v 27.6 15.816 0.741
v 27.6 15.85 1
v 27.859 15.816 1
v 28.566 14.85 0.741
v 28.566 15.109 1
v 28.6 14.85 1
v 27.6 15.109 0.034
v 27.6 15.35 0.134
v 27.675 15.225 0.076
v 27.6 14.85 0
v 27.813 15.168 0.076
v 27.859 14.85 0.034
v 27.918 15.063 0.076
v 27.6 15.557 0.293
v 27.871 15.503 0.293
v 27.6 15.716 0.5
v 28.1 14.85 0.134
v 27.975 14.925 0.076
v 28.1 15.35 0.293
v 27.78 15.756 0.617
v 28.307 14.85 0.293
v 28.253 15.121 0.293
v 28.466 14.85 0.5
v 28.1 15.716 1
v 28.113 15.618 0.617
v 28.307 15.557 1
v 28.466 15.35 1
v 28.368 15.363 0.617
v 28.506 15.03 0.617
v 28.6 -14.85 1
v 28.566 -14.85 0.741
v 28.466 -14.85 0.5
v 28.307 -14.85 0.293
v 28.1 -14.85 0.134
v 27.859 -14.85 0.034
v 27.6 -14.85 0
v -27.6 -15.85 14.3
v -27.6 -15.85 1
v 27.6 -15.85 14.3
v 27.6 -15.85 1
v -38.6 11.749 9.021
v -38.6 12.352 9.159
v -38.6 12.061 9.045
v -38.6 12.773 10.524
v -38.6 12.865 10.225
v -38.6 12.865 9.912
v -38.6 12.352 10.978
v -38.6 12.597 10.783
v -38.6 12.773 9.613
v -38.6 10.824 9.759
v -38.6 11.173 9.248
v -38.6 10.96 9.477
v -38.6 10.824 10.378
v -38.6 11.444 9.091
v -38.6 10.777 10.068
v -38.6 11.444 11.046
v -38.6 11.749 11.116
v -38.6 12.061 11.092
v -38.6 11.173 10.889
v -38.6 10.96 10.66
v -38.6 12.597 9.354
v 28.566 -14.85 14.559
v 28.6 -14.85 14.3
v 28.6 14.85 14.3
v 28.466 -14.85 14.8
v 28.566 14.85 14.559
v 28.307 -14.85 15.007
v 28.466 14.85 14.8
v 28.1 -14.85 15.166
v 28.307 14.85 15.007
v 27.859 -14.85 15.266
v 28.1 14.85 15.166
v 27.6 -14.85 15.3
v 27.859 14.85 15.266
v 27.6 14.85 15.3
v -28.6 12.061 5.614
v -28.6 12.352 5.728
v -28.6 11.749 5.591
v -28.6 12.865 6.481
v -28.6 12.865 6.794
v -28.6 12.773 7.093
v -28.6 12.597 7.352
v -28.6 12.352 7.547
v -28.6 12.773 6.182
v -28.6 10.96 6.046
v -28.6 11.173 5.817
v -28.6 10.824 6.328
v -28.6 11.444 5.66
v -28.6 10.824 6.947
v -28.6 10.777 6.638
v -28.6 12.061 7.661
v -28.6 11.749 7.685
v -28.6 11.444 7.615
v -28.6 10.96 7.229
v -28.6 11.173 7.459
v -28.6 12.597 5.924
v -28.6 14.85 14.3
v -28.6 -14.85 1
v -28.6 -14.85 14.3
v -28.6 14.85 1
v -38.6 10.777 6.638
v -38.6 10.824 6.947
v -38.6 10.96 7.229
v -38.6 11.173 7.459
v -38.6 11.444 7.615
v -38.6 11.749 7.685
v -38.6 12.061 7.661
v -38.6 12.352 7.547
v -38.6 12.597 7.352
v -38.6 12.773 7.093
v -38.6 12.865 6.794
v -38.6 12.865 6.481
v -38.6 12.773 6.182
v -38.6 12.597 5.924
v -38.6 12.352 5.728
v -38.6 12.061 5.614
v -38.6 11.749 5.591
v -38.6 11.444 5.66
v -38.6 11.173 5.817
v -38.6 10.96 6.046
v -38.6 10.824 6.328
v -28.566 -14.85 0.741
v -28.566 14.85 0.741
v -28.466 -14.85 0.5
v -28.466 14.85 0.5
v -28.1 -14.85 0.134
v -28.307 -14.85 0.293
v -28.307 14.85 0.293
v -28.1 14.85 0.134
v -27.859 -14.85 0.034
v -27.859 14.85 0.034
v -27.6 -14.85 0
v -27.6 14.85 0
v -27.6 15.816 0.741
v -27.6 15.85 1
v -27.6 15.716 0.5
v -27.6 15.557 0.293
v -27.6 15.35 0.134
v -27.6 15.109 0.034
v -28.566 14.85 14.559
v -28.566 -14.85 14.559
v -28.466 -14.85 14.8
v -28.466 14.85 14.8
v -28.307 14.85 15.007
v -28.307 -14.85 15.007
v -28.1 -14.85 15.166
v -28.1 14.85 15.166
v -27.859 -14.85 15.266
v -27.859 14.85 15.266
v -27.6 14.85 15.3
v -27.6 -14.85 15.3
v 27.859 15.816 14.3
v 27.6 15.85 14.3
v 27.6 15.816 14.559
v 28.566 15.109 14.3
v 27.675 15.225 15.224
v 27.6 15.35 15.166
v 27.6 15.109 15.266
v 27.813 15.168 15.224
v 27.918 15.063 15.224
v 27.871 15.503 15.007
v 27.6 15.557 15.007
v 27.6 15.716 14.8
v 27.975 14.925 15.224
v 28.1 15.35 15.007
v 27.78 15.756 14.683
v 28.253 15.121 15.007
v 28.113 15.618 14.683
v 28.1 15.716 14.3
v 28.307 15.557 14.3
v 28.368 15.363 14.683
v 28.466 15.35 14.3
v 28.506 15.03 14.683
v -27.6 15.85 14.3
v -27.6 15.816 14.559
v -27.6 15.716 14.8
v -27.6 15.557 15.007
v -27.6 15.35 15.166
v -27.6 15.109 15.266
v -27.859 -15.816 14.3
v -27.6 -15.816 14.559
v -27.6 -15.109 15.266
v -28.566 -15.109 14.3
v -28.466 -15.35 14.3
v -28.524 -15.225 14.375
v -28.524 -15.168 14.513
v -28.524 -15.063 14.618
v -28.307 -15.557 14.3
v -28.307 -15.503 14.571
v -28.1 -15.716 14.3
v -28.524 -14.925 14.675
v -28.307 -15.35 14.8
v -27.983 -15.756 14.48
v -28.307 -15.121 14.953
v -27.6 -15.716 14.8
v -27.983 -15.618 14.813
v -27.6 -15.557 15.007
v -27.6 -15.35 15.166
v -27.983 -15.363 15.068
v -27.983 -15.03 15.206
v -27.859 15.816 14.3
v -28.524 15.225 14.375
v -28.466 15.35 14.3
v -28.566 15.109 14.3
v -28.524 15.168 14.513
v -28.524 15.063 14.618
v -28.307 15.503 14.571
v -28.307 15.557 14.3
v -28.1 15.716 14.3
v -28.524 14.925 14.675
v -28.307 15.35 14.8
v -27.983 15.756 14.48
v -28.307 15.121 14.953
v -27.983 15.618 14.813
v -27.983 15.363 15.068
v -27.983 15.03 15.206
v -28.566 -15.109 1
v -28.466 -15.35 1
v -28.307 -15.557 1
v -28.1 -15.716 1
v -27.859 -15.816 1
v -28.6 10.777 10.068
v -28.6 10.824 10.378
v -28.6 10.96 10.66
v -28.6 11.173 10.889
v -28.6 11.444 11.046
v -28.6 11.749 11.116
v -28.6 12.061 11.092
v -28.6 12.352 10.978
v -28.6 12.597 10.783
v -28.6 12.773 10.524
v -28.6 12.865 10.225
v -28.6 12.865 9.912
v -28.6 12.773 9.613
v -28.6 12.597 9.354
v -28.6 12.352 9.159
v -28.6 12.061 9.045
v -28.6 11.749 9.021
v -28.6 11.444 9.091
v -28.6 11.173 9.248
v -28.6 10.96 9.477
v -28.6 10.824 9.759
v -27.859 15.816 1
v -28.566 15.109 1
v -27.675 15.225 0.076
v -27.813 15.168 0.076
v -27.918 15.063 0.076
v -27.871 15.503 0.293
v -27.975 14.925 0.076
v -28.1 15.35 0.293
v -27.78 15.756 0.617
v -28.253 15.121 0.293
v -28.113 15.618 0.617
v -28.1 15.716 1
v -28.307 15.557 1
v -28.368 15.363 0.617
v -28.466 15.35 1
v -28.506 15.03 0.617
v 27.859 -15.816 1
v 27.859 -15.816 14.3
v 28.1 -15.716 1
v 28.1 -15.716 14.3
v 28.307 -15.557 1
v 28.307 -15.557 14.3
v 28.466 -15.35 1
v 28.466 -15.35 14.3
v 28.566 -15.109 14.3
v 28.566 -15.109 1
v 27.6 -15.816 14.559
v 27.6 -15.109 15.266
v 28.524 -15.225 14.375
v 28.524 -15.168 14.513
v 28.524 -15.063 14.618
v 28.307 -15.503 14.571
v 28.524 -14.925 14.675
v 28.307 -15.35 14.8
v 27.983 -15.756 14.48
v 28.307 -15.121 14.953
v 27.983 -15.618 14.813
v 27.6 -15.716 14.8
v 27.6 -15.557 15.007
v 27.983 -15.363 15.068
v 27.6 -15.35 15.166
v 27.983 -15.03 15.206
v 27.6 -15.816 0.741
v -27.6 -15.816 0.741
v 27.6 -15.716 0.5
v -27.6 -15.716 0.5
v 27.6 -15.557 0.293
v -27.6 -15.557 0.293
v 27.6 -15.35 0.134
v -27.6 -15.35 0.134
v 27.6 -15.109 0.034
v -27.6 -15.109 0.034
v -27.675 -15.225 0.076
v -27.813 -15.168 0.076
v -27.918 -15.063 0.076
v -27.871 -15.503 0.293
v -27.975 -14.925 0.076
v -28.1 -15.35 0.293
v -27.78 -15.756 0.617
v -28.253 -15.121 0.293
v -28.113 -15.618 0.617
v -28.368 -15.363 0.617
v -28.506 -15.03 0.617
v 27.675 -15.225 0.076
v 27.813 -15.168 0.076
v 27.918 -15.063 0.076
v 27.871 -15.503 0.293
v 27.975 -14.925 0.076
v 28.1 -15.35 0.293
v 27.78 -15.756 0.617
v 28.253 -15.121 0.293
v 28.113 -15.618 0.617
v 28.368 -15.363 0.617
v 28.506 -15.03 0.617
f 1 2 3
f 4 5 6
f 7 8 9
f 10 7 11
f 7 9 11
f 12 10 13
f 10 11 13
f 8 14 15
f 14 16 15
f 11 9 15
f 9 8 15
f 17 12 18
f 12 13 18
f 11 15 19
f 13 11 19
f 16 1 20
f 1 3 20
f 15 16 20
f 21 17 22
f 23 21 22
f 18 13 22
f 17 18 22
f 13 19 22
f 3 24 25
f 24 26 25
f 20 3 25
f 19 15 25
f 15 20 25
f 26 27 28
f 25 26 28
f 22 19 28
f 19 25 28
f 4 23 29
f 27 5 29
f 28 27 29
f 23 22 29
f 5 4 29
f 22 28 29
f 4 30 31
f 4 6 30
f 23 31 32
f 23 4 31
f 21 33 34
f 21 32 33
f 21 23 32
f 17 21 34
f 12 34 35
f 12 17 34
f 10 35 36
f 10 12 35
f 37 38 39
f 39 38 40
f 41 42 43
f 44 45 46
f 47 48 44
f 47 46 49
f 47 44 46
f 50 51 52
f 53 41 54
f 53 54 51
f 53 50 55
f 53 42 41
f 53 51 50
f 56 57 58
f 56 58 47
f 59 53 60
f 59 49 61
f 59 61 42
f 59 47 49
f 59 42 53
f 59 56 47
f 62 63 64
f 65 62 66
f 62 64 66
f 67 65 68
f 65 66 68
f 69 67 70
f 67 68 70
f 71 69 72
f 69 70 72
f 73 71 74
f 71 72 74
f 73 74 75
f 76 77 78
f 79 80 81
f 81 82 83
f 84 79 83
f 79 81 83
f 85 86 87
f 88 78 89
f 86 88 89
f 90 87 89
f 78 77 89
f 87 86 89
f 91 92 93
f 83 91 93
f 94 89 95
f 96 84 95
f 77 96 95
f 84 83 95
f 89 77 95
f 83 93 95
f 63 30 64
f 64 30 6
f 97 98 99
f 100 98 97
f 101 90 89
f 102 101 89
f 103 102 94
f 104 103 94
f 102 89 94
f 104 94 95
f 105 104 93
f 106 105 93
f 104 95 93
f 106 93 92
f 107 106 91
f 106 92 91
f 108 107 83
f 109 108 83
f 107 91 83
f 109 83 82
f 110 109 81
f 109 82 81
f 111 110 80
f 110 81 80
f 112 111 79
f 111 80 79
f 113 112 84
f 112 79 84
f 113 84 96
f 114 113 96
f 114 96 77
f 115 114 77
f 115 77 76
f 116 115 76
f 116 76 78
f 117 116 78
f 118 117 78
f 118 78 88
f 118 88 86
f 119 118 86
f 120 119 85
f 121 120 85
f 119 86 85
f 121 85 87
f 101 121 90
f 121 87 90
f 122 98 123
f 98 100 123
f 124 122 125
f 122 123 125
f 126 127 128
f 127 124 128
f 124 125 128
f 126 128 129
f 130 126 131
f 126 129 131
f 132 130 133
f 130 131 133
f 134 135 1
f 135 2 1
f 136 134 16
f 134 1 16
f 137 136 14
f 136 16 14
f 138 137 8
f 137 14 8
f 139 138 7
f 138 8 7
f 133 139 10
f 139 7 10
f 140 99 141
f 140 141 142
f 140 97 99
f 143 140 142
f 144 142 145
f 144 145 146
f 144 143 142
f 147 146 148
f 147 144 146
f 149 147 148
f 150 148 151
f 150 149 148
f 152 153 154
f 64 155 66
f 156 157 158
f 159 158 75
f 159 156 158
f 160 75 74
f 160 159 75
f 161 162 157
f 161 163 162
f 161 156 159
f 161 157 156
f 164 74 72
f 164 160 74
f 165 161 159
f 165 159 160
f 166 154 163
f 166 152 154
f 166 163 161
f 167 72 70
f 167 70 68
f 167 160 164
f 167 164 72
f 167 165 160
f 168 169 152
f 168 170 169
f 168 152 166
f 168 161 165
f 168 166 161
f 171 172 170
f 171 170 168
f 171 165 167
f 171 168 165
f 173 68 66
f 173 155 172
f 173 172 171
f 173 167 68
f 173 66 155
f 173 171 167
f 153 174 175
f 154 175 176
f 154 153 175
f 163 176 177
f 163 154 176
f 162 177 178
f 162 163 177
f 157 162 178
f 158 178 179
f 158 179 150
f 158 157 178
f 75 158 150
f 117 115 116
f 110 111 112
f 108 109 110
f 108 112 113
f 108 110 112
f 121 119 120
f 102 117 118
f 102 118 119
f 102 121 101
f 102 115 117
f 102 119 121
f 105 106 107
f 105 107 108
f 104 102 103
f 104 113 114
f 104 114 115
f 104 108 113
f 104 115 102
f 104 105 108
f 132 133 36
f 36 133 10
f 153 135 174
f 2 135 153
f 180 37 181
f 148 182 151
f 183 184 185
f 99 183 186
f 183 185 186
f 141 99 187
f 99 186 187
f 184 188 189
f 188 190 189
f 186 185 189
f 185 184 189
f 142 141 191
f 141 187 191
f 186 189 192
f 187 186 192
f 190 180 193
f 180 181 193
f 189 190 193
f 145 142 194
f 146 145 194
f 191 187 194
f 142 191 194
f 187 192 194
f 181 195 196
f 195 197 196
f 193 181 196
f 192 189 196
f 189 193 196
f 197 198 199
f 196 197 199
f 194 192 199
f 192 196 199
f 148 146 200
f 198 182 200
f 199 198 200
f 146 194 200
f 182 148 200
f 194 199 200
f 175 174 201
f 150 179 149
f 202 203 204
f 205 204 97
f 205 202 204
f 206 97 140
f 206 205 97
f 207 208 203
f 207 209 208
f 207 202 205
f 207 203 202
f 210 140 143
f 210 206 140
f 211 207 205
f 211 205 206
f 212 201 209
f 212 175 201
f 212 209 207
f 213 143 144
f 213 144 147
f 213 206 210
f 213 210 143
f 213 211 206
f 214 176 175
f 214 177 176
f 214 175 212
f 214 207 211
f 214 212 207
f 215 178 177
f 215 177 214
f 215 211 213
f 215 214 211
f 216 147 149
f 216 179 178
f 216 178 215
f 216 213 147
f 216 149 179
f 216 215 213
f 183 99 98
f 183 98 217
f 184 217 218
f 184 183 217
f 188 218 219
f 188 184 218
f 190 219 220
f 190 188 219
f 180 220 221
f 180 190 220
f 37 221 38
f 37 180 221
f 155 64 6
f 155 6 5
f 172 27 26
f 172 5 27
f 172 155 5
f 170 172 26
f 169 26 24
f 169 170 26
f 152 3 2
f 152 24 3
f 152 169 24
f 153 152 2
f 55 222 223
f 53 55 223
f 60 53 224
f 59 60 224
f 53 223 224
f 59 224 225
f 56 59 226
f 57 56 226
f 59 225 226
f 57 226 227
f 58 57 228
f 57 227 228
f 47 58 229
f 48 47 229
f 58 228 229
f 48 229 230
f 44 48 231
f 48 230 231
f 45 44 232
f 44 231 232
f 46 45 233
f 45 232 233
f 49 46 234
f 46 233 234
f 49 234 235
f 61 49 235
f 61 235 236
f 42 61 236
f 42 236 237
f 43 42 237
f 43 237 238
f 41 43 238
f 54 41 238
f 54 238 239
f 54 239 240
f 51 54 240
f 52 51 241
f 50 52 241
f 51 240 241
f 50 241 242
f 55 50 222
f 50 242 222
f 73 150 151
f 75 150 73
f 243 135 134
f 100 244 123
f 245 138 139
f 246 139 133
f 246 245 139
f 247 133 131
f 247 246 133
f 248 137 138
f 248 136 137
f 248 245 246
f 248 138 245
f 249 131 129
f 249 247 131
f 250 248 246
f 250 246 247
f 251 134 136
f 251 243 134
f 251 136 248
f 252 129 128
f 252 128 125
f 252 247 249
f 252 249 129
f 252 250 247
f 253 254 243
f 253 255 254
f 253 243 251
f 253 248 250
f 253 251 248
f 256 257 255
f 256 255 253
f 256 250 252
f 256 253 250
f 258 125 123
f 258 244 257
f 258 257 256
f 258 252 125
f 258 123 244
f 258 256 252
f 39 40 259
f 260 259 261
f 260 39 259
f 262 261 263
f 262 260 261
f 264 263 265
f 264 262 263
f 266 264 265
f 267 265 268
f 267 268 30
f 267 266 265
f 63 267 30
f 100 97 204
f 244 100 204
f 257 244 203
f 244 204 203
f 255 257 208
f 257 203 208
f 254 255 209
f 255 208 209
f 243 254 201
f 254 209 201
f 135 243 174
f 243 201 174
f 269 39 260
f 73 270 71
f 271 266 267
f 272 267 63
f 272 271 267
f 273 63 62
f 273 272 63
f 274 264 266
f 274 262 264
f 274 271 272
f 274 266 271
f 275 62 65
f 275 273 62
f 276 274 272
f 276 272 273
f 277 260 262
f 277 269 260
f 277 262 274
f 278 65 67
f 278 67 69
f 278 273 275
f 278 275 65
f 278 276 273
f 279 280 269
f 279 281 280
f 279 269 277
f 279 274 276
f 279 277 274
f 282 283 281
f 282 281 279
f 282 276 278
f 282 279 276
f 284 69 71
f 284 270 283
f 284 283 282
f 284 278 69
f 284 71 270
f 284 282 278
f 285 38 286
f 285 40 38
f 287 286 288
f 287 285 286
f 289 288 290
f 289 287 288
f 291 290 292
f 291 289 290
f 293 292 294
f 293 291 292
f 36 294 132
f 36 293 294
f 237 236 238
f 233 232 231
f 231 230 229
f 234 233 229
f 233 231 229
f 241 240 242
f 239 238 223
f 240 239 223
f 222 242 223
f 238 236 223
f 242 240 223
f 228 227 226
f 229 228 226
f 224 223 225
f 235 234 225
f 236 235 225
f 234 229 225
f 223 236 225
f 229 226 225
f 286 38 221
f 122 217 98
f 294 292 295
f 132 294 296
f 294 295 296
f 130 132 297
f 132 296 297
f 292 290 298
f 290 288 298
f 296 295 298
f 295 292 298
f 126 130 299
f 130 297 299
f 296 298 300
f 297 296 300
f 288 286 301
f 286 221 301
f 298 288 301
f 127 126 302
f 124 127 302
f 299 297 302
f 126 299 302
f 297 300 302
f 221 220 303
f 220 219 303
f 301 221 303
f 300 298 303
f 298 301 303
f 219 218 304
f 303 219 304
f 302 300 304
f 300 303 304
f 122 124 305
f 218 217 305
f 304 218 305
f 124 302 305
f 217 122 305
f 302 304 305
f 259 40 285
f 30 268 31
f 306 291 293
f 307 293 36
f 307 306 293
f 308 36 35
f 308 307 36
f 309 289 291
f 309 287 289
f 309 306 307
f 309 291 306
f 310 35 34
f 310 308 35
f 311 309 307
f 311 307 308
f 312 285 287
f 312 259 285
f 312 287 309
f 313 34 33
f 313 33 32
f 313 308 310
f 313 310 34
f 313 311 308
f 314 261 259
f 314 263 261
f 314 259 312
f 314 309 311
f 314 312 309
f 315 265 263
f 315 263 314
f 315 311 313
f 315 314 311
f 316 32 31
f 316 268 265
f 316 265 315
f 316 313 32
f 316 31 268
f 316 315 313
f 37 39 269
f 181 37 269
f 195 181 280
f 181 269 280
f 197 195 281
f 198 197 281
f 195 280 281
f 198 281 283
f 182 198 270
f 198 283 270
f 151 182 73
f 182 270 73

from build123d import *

# Parameters (mm, degrees)
F0_W     = 57.2
F0_H     = 31.7
F1_DEPTH = 15.3
F2_R     = 1
F3_R     = 1.05
F4_DEPTH = 10


with BuildPart() as f1:
    # F0 (on Top) → F1 (new body)
    with BuildSketch(Plane.XY):
        Rectangle(F0_W, F0_H)
    extrude(amount=F1_DEPTH)

    # F2
    f2_edges = [f1.edges().sort_by_distance(p)[0] for p in [
        (0, -15.85, 15.3),
        (28.6, 15.85, 7.65),
        (28.6, -15.85, 7.65),
        (-28.6, -15.85, 7.65),
        (0, 15.85, 15.3),
        (0, -15.85, 0),
        (-28.6, 15.85, 7.65),
        (0, 15.85, 0),
        (28.6, 0, 0),
        (28.6, 0, 15.3),
        (-28.6, 0, 0),
        (-28.6, 0, 15.3),
    ]]
    fillet(f2_edges, radius=F2_R)


with BuildPart() as f4:
    # F3 (on face) → F4 (new body)
    with BuildSketch(Plane(origin=(-28.6, 0, 0), x_dir=(0, -1, 0), z_dir=(-1, 0, 0))):
        with Locations((-11.827209, 10.068467)):
            Circle(F3_R)
        with Locations((-11.827209, 6.637755)):
            Circle(F3_R)
    extrude(amount=F4_DEPTH)


solid = Compound([f1.part, f4.part])
